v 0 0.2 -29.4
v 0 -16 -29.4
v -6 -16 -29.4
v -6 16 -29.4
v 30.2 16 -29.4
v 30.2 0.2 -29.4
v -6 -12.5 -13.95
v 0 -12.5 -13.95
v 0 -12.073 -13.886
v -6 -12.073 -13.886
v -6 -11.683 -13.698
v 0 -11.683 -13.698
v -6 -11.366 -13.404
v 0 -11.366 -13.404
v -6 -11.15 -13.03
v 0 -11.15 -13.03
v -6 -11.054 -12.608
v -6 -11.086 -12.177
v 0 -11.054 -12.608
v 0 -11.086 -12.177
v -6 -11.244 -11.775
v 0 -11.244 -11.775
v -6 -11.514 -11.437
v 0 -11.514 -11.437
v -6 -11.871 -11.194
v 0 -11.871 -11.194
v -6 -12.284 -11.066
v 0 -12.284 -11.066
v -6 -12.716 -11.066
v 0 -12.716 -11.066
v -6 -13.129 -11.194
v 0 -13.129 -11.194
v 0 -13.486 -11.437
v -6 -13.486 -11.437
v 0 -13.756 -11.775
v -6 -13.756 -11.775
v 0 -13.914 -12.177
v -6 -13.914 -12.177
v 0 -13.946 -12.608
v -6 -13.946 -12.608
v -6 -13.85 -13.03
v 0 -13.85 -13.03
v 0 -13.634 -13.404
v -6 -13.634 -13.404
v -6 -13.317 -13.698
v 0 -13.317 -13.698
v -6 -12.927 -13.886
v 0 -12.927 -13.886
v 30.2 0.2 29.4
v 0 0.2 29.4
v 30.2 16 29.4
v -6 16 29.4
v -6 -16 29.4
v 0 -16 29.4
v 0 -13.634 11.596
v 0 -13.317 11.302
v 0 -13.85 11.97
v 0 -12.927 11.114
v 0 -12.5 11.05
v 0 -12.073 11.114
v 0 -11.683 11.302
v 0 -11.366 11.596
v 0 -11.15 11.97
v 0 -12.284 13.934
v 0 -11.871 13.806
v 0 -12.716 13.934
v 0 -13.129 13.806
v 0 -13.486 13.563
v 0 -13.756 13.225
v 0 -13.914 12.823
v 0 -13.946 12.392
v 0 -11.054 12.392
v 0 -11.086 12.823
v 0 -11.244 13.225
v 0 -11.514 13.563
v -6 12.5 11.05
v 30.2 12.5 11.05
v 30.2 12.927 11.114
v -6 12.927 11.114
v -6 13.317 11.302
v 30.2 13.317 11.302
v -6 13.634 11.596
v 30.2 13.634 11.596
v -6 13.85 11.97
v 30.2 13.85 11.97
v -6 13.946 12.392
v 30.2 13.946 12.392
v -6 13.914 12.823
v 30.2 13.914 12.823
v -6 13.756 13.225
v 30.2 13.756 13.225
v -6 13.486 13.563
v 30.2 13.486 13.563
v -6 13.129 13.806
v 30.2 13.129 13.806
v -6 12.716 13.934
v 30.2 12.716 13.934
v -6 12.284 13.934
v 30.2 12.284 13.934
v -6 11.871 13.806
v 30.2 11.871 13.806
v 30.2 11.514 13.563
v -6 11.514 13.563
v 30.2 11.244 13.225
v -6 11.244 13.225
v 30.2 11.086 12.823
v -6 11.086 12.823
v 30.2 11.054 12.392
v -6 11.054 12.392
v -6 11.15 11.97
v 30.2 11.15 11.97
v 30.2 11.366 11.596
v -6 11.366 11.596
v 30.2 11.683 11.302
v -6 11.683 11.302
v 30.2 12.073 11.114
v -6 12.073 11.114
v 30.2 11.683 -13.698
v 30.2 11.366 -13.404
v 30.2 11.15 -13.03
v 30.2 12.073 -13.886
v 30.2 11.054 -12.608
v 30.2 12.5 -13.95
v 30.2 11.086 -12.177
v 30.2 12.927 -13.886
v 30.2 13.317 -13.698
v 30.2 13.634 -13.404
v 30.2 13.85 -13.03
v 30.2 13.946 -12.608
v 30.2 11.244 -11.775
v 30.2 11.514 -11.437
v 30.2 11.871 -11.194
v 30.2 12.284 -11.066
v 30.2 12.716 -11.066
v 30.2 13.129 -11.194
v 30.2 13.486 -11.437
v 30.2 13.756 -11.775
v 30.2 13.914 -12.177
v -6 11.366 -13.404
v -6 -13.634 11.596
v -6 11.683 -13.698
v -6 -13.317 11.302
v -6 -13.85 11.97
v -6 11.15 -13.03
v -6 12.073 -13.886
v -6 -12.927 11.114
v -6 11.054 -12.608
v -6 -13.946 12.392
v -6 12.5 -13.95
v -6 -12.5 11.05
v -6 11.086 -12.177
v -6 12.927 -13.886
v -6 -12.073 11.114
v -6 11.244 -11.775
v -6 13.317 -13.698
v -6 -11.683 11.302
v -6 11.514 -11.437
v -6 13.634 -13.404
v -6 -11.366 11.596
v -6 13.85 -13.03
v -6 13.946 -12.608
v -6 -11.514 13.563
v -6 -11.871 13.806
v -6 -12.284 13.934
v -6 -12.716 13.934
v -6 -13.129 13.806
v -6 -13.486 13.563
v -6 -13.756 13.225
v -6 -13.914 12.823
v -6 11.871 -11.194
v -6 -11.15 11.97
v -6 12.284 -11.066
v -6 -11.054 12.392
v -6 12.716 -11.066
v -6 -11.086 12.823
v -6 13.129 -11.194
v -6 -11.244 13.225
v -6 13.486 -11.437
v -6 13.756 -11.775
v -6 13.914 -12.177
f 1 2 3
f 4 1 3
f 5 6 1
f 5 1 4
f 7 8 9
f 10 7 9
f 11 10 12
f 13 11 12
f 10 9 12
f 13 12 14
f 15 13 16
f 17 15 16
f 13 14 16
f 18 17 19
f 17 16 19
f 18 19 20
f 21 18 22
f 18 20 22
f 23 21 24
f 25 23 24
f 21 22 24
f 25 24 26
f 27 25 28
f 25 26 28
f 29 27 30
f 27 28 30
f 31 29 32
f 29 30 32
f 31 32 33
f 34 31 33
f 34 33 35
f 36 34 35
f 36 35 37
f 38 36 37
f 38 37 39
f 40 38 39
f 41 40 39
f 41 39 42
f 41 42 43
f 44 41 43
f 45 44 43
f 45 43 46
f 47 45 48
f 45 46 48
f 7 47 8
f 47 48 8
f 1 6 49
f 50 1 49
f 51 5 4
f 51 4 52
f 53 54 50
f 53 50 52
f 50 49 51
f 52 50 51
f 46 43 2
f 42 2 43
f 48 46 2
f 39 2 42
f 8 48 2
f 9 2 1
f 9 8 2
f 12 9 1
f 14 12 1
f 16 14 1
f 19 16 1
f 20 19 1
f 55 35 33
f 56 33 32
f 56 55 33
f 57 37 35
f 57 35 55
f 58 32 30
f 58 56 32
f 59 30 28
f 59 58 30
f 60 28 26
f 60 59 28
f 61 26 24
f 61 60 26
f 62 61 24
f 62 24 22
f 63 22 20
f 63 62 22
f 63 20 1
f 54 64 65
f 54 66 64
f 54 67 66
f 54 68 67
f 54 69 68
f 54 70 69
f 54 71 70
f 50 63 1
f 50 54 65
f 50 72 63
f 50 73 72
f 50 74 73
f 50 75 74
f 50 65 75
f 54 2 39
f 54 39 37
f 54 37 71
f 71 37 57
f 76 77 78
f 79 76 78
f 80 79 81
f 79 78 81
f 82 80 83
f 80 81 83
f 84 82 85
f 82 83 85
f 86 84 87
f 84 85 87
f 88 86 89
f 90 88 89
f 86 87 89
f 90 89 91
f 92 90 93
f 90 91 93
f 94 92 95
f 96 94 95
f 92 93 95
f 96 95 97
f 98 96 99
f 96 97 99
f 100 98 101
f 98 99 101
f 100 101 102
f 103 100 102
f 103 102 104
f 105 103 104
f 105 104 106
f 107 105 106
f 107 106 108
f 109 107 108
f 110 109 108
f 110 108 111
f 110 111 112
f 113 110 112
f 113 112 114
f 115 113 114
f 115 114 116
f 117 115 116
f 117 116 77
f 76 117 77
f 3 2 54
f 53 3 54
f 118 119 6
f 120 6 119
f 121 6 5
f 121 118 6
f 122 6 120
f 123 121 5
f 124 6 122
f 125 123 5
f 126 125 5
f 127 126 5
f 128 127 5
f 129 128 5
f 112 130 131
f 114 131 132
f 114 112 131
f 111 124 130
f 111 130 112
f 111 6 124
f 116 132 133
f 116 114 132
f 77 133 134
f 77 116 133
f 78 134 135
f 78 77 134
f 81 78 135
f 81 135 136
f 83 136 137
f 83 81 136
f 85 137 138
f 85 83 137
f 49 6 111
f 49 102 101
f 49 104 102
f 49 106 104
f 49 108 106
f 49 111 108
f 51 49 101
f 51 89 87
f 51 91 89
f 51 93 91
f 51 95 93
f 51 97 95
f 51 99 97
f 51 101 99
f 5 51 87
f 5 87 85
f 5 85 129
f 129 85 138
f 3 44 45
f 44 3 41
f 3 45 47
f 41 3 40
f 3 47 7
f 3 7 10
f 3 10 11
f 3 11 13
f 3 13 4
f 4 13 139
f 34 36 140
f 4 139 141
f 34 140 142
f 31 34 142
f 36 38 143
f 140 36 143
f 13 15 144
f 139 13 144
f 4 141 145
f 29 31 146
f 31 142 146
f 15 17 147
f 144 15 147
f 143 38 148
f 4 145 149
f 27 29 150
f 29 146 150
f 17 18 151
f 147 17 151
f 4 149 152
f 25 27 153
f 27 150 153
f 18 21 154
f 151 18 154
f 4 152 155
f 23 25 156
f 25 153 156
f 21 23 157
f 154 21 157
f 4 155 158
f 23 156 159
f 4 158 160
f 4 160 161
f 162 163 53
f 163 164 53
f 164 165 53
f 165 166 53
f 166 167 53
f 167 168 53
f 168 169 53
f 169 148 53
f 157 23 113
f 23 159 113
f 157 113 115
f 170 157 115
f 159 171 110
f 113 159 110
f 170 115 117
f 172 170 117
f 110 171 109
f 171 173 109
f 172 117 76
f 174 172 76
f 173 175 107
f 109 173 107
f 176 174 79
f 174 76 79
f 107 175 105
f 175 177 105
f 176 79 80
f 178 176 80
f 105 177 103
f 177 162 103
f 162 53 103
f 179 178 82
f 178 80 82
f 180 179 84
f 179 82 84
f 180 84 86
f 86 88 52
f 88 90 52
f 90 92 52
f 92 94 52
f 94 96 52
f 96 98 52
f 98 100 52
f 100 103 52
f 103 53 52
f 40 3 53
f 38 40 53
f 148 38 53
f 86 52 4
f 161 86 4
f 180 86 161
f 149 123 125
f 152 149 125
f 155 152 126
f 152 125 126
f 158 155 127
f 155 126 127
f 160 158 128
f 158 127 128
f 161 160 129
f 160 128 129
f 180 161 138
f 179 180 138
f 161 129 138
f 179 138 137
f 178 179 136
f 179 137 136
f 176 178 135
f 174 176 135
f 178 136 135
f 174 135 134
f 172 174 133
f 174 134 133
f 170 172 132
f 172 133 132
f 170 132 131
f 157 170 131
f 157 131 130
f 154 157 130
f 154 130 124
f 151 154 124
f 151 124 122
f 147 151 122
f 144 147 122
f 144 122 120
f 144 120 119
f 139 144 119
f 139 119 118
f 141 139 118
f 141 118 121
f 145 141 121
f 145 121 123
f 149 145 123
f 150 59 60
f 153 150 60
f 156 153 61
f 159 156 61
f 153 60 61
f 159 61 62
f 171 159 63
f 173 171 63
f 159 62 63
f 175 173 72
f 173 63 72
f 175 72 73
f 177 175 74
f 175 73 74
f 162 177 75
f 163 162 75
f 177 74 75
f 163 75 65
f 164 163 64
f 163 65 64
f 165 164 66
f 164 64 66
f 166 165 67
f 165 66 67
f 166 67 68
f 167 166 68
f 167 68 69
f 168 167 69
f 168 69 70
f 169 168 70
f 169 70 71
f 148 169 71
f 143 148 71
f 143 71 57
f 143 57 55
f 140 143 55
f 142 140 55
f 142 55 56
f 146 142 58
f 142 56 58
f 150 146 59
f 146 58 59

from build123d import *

# Parameters (mm, degrees)
SKETCH1_W           = 32
SKETCH1_H           = 58.8
SKETCH1_R           = 1.45
BOSS_EXTRUDE1_DEPTH = 6
BOSS_EXTRUDE2_START = 30.2
SKETCH1_3_W         = 15.8
SKETCH1_3_H         = 58.8
SKETCH1_3_R         = 1.45
BOSS_EXTRUDE2_DEPTH = 30.2


with BuildPart() as part:
    # Sketch1 → Boss-Extrude1 (new body)
    with BuildSketch(Plane.YZ):
        Rectangle(SKETCH1_W, SKETCH1_H)
        with Locations((12.5, -12.5)):
            Circle(SKETCH1_R, mode=Mode.SUBTRACT)
        with Locations((12.5, 12.5)):
            Circle(SKETCH1_R, mode=Mode.SUBTRACT)
        with Locations((-12.5, 12.5)):
            Circle(SKETCH1_R, mode=Mode.SUBTRACT)
        with Locations((-12.5, -12.5)):
            Circle(SKETCH1_R, mode=Mode.SUBTRACT)
    extrude(amount=-BOSS_EXTRUDE1_DEPTH)

    # Sketch1<3> → Boss-Extrude2 (add)
    with BuildSketch(Plane.YZ.offset(BOSS_EXTRUDE2_START)):
        with Locations((8.1, 0)):
            Rectangle(SKETCH1_3_W, SKETCH1_3_H)
        with Locations((12.5, -12.5)):
            Circle(SKETCH1_3_R, mode=Mode.SUBTRACT)
        with Locations((12.5, 12.5)):
            Circle(SKETCH1_3_R, mode=Mode.SUBTRACT)
    extrude(amount=-BOSS_EXTRUDE2_DEPTH)


solid = part.part
